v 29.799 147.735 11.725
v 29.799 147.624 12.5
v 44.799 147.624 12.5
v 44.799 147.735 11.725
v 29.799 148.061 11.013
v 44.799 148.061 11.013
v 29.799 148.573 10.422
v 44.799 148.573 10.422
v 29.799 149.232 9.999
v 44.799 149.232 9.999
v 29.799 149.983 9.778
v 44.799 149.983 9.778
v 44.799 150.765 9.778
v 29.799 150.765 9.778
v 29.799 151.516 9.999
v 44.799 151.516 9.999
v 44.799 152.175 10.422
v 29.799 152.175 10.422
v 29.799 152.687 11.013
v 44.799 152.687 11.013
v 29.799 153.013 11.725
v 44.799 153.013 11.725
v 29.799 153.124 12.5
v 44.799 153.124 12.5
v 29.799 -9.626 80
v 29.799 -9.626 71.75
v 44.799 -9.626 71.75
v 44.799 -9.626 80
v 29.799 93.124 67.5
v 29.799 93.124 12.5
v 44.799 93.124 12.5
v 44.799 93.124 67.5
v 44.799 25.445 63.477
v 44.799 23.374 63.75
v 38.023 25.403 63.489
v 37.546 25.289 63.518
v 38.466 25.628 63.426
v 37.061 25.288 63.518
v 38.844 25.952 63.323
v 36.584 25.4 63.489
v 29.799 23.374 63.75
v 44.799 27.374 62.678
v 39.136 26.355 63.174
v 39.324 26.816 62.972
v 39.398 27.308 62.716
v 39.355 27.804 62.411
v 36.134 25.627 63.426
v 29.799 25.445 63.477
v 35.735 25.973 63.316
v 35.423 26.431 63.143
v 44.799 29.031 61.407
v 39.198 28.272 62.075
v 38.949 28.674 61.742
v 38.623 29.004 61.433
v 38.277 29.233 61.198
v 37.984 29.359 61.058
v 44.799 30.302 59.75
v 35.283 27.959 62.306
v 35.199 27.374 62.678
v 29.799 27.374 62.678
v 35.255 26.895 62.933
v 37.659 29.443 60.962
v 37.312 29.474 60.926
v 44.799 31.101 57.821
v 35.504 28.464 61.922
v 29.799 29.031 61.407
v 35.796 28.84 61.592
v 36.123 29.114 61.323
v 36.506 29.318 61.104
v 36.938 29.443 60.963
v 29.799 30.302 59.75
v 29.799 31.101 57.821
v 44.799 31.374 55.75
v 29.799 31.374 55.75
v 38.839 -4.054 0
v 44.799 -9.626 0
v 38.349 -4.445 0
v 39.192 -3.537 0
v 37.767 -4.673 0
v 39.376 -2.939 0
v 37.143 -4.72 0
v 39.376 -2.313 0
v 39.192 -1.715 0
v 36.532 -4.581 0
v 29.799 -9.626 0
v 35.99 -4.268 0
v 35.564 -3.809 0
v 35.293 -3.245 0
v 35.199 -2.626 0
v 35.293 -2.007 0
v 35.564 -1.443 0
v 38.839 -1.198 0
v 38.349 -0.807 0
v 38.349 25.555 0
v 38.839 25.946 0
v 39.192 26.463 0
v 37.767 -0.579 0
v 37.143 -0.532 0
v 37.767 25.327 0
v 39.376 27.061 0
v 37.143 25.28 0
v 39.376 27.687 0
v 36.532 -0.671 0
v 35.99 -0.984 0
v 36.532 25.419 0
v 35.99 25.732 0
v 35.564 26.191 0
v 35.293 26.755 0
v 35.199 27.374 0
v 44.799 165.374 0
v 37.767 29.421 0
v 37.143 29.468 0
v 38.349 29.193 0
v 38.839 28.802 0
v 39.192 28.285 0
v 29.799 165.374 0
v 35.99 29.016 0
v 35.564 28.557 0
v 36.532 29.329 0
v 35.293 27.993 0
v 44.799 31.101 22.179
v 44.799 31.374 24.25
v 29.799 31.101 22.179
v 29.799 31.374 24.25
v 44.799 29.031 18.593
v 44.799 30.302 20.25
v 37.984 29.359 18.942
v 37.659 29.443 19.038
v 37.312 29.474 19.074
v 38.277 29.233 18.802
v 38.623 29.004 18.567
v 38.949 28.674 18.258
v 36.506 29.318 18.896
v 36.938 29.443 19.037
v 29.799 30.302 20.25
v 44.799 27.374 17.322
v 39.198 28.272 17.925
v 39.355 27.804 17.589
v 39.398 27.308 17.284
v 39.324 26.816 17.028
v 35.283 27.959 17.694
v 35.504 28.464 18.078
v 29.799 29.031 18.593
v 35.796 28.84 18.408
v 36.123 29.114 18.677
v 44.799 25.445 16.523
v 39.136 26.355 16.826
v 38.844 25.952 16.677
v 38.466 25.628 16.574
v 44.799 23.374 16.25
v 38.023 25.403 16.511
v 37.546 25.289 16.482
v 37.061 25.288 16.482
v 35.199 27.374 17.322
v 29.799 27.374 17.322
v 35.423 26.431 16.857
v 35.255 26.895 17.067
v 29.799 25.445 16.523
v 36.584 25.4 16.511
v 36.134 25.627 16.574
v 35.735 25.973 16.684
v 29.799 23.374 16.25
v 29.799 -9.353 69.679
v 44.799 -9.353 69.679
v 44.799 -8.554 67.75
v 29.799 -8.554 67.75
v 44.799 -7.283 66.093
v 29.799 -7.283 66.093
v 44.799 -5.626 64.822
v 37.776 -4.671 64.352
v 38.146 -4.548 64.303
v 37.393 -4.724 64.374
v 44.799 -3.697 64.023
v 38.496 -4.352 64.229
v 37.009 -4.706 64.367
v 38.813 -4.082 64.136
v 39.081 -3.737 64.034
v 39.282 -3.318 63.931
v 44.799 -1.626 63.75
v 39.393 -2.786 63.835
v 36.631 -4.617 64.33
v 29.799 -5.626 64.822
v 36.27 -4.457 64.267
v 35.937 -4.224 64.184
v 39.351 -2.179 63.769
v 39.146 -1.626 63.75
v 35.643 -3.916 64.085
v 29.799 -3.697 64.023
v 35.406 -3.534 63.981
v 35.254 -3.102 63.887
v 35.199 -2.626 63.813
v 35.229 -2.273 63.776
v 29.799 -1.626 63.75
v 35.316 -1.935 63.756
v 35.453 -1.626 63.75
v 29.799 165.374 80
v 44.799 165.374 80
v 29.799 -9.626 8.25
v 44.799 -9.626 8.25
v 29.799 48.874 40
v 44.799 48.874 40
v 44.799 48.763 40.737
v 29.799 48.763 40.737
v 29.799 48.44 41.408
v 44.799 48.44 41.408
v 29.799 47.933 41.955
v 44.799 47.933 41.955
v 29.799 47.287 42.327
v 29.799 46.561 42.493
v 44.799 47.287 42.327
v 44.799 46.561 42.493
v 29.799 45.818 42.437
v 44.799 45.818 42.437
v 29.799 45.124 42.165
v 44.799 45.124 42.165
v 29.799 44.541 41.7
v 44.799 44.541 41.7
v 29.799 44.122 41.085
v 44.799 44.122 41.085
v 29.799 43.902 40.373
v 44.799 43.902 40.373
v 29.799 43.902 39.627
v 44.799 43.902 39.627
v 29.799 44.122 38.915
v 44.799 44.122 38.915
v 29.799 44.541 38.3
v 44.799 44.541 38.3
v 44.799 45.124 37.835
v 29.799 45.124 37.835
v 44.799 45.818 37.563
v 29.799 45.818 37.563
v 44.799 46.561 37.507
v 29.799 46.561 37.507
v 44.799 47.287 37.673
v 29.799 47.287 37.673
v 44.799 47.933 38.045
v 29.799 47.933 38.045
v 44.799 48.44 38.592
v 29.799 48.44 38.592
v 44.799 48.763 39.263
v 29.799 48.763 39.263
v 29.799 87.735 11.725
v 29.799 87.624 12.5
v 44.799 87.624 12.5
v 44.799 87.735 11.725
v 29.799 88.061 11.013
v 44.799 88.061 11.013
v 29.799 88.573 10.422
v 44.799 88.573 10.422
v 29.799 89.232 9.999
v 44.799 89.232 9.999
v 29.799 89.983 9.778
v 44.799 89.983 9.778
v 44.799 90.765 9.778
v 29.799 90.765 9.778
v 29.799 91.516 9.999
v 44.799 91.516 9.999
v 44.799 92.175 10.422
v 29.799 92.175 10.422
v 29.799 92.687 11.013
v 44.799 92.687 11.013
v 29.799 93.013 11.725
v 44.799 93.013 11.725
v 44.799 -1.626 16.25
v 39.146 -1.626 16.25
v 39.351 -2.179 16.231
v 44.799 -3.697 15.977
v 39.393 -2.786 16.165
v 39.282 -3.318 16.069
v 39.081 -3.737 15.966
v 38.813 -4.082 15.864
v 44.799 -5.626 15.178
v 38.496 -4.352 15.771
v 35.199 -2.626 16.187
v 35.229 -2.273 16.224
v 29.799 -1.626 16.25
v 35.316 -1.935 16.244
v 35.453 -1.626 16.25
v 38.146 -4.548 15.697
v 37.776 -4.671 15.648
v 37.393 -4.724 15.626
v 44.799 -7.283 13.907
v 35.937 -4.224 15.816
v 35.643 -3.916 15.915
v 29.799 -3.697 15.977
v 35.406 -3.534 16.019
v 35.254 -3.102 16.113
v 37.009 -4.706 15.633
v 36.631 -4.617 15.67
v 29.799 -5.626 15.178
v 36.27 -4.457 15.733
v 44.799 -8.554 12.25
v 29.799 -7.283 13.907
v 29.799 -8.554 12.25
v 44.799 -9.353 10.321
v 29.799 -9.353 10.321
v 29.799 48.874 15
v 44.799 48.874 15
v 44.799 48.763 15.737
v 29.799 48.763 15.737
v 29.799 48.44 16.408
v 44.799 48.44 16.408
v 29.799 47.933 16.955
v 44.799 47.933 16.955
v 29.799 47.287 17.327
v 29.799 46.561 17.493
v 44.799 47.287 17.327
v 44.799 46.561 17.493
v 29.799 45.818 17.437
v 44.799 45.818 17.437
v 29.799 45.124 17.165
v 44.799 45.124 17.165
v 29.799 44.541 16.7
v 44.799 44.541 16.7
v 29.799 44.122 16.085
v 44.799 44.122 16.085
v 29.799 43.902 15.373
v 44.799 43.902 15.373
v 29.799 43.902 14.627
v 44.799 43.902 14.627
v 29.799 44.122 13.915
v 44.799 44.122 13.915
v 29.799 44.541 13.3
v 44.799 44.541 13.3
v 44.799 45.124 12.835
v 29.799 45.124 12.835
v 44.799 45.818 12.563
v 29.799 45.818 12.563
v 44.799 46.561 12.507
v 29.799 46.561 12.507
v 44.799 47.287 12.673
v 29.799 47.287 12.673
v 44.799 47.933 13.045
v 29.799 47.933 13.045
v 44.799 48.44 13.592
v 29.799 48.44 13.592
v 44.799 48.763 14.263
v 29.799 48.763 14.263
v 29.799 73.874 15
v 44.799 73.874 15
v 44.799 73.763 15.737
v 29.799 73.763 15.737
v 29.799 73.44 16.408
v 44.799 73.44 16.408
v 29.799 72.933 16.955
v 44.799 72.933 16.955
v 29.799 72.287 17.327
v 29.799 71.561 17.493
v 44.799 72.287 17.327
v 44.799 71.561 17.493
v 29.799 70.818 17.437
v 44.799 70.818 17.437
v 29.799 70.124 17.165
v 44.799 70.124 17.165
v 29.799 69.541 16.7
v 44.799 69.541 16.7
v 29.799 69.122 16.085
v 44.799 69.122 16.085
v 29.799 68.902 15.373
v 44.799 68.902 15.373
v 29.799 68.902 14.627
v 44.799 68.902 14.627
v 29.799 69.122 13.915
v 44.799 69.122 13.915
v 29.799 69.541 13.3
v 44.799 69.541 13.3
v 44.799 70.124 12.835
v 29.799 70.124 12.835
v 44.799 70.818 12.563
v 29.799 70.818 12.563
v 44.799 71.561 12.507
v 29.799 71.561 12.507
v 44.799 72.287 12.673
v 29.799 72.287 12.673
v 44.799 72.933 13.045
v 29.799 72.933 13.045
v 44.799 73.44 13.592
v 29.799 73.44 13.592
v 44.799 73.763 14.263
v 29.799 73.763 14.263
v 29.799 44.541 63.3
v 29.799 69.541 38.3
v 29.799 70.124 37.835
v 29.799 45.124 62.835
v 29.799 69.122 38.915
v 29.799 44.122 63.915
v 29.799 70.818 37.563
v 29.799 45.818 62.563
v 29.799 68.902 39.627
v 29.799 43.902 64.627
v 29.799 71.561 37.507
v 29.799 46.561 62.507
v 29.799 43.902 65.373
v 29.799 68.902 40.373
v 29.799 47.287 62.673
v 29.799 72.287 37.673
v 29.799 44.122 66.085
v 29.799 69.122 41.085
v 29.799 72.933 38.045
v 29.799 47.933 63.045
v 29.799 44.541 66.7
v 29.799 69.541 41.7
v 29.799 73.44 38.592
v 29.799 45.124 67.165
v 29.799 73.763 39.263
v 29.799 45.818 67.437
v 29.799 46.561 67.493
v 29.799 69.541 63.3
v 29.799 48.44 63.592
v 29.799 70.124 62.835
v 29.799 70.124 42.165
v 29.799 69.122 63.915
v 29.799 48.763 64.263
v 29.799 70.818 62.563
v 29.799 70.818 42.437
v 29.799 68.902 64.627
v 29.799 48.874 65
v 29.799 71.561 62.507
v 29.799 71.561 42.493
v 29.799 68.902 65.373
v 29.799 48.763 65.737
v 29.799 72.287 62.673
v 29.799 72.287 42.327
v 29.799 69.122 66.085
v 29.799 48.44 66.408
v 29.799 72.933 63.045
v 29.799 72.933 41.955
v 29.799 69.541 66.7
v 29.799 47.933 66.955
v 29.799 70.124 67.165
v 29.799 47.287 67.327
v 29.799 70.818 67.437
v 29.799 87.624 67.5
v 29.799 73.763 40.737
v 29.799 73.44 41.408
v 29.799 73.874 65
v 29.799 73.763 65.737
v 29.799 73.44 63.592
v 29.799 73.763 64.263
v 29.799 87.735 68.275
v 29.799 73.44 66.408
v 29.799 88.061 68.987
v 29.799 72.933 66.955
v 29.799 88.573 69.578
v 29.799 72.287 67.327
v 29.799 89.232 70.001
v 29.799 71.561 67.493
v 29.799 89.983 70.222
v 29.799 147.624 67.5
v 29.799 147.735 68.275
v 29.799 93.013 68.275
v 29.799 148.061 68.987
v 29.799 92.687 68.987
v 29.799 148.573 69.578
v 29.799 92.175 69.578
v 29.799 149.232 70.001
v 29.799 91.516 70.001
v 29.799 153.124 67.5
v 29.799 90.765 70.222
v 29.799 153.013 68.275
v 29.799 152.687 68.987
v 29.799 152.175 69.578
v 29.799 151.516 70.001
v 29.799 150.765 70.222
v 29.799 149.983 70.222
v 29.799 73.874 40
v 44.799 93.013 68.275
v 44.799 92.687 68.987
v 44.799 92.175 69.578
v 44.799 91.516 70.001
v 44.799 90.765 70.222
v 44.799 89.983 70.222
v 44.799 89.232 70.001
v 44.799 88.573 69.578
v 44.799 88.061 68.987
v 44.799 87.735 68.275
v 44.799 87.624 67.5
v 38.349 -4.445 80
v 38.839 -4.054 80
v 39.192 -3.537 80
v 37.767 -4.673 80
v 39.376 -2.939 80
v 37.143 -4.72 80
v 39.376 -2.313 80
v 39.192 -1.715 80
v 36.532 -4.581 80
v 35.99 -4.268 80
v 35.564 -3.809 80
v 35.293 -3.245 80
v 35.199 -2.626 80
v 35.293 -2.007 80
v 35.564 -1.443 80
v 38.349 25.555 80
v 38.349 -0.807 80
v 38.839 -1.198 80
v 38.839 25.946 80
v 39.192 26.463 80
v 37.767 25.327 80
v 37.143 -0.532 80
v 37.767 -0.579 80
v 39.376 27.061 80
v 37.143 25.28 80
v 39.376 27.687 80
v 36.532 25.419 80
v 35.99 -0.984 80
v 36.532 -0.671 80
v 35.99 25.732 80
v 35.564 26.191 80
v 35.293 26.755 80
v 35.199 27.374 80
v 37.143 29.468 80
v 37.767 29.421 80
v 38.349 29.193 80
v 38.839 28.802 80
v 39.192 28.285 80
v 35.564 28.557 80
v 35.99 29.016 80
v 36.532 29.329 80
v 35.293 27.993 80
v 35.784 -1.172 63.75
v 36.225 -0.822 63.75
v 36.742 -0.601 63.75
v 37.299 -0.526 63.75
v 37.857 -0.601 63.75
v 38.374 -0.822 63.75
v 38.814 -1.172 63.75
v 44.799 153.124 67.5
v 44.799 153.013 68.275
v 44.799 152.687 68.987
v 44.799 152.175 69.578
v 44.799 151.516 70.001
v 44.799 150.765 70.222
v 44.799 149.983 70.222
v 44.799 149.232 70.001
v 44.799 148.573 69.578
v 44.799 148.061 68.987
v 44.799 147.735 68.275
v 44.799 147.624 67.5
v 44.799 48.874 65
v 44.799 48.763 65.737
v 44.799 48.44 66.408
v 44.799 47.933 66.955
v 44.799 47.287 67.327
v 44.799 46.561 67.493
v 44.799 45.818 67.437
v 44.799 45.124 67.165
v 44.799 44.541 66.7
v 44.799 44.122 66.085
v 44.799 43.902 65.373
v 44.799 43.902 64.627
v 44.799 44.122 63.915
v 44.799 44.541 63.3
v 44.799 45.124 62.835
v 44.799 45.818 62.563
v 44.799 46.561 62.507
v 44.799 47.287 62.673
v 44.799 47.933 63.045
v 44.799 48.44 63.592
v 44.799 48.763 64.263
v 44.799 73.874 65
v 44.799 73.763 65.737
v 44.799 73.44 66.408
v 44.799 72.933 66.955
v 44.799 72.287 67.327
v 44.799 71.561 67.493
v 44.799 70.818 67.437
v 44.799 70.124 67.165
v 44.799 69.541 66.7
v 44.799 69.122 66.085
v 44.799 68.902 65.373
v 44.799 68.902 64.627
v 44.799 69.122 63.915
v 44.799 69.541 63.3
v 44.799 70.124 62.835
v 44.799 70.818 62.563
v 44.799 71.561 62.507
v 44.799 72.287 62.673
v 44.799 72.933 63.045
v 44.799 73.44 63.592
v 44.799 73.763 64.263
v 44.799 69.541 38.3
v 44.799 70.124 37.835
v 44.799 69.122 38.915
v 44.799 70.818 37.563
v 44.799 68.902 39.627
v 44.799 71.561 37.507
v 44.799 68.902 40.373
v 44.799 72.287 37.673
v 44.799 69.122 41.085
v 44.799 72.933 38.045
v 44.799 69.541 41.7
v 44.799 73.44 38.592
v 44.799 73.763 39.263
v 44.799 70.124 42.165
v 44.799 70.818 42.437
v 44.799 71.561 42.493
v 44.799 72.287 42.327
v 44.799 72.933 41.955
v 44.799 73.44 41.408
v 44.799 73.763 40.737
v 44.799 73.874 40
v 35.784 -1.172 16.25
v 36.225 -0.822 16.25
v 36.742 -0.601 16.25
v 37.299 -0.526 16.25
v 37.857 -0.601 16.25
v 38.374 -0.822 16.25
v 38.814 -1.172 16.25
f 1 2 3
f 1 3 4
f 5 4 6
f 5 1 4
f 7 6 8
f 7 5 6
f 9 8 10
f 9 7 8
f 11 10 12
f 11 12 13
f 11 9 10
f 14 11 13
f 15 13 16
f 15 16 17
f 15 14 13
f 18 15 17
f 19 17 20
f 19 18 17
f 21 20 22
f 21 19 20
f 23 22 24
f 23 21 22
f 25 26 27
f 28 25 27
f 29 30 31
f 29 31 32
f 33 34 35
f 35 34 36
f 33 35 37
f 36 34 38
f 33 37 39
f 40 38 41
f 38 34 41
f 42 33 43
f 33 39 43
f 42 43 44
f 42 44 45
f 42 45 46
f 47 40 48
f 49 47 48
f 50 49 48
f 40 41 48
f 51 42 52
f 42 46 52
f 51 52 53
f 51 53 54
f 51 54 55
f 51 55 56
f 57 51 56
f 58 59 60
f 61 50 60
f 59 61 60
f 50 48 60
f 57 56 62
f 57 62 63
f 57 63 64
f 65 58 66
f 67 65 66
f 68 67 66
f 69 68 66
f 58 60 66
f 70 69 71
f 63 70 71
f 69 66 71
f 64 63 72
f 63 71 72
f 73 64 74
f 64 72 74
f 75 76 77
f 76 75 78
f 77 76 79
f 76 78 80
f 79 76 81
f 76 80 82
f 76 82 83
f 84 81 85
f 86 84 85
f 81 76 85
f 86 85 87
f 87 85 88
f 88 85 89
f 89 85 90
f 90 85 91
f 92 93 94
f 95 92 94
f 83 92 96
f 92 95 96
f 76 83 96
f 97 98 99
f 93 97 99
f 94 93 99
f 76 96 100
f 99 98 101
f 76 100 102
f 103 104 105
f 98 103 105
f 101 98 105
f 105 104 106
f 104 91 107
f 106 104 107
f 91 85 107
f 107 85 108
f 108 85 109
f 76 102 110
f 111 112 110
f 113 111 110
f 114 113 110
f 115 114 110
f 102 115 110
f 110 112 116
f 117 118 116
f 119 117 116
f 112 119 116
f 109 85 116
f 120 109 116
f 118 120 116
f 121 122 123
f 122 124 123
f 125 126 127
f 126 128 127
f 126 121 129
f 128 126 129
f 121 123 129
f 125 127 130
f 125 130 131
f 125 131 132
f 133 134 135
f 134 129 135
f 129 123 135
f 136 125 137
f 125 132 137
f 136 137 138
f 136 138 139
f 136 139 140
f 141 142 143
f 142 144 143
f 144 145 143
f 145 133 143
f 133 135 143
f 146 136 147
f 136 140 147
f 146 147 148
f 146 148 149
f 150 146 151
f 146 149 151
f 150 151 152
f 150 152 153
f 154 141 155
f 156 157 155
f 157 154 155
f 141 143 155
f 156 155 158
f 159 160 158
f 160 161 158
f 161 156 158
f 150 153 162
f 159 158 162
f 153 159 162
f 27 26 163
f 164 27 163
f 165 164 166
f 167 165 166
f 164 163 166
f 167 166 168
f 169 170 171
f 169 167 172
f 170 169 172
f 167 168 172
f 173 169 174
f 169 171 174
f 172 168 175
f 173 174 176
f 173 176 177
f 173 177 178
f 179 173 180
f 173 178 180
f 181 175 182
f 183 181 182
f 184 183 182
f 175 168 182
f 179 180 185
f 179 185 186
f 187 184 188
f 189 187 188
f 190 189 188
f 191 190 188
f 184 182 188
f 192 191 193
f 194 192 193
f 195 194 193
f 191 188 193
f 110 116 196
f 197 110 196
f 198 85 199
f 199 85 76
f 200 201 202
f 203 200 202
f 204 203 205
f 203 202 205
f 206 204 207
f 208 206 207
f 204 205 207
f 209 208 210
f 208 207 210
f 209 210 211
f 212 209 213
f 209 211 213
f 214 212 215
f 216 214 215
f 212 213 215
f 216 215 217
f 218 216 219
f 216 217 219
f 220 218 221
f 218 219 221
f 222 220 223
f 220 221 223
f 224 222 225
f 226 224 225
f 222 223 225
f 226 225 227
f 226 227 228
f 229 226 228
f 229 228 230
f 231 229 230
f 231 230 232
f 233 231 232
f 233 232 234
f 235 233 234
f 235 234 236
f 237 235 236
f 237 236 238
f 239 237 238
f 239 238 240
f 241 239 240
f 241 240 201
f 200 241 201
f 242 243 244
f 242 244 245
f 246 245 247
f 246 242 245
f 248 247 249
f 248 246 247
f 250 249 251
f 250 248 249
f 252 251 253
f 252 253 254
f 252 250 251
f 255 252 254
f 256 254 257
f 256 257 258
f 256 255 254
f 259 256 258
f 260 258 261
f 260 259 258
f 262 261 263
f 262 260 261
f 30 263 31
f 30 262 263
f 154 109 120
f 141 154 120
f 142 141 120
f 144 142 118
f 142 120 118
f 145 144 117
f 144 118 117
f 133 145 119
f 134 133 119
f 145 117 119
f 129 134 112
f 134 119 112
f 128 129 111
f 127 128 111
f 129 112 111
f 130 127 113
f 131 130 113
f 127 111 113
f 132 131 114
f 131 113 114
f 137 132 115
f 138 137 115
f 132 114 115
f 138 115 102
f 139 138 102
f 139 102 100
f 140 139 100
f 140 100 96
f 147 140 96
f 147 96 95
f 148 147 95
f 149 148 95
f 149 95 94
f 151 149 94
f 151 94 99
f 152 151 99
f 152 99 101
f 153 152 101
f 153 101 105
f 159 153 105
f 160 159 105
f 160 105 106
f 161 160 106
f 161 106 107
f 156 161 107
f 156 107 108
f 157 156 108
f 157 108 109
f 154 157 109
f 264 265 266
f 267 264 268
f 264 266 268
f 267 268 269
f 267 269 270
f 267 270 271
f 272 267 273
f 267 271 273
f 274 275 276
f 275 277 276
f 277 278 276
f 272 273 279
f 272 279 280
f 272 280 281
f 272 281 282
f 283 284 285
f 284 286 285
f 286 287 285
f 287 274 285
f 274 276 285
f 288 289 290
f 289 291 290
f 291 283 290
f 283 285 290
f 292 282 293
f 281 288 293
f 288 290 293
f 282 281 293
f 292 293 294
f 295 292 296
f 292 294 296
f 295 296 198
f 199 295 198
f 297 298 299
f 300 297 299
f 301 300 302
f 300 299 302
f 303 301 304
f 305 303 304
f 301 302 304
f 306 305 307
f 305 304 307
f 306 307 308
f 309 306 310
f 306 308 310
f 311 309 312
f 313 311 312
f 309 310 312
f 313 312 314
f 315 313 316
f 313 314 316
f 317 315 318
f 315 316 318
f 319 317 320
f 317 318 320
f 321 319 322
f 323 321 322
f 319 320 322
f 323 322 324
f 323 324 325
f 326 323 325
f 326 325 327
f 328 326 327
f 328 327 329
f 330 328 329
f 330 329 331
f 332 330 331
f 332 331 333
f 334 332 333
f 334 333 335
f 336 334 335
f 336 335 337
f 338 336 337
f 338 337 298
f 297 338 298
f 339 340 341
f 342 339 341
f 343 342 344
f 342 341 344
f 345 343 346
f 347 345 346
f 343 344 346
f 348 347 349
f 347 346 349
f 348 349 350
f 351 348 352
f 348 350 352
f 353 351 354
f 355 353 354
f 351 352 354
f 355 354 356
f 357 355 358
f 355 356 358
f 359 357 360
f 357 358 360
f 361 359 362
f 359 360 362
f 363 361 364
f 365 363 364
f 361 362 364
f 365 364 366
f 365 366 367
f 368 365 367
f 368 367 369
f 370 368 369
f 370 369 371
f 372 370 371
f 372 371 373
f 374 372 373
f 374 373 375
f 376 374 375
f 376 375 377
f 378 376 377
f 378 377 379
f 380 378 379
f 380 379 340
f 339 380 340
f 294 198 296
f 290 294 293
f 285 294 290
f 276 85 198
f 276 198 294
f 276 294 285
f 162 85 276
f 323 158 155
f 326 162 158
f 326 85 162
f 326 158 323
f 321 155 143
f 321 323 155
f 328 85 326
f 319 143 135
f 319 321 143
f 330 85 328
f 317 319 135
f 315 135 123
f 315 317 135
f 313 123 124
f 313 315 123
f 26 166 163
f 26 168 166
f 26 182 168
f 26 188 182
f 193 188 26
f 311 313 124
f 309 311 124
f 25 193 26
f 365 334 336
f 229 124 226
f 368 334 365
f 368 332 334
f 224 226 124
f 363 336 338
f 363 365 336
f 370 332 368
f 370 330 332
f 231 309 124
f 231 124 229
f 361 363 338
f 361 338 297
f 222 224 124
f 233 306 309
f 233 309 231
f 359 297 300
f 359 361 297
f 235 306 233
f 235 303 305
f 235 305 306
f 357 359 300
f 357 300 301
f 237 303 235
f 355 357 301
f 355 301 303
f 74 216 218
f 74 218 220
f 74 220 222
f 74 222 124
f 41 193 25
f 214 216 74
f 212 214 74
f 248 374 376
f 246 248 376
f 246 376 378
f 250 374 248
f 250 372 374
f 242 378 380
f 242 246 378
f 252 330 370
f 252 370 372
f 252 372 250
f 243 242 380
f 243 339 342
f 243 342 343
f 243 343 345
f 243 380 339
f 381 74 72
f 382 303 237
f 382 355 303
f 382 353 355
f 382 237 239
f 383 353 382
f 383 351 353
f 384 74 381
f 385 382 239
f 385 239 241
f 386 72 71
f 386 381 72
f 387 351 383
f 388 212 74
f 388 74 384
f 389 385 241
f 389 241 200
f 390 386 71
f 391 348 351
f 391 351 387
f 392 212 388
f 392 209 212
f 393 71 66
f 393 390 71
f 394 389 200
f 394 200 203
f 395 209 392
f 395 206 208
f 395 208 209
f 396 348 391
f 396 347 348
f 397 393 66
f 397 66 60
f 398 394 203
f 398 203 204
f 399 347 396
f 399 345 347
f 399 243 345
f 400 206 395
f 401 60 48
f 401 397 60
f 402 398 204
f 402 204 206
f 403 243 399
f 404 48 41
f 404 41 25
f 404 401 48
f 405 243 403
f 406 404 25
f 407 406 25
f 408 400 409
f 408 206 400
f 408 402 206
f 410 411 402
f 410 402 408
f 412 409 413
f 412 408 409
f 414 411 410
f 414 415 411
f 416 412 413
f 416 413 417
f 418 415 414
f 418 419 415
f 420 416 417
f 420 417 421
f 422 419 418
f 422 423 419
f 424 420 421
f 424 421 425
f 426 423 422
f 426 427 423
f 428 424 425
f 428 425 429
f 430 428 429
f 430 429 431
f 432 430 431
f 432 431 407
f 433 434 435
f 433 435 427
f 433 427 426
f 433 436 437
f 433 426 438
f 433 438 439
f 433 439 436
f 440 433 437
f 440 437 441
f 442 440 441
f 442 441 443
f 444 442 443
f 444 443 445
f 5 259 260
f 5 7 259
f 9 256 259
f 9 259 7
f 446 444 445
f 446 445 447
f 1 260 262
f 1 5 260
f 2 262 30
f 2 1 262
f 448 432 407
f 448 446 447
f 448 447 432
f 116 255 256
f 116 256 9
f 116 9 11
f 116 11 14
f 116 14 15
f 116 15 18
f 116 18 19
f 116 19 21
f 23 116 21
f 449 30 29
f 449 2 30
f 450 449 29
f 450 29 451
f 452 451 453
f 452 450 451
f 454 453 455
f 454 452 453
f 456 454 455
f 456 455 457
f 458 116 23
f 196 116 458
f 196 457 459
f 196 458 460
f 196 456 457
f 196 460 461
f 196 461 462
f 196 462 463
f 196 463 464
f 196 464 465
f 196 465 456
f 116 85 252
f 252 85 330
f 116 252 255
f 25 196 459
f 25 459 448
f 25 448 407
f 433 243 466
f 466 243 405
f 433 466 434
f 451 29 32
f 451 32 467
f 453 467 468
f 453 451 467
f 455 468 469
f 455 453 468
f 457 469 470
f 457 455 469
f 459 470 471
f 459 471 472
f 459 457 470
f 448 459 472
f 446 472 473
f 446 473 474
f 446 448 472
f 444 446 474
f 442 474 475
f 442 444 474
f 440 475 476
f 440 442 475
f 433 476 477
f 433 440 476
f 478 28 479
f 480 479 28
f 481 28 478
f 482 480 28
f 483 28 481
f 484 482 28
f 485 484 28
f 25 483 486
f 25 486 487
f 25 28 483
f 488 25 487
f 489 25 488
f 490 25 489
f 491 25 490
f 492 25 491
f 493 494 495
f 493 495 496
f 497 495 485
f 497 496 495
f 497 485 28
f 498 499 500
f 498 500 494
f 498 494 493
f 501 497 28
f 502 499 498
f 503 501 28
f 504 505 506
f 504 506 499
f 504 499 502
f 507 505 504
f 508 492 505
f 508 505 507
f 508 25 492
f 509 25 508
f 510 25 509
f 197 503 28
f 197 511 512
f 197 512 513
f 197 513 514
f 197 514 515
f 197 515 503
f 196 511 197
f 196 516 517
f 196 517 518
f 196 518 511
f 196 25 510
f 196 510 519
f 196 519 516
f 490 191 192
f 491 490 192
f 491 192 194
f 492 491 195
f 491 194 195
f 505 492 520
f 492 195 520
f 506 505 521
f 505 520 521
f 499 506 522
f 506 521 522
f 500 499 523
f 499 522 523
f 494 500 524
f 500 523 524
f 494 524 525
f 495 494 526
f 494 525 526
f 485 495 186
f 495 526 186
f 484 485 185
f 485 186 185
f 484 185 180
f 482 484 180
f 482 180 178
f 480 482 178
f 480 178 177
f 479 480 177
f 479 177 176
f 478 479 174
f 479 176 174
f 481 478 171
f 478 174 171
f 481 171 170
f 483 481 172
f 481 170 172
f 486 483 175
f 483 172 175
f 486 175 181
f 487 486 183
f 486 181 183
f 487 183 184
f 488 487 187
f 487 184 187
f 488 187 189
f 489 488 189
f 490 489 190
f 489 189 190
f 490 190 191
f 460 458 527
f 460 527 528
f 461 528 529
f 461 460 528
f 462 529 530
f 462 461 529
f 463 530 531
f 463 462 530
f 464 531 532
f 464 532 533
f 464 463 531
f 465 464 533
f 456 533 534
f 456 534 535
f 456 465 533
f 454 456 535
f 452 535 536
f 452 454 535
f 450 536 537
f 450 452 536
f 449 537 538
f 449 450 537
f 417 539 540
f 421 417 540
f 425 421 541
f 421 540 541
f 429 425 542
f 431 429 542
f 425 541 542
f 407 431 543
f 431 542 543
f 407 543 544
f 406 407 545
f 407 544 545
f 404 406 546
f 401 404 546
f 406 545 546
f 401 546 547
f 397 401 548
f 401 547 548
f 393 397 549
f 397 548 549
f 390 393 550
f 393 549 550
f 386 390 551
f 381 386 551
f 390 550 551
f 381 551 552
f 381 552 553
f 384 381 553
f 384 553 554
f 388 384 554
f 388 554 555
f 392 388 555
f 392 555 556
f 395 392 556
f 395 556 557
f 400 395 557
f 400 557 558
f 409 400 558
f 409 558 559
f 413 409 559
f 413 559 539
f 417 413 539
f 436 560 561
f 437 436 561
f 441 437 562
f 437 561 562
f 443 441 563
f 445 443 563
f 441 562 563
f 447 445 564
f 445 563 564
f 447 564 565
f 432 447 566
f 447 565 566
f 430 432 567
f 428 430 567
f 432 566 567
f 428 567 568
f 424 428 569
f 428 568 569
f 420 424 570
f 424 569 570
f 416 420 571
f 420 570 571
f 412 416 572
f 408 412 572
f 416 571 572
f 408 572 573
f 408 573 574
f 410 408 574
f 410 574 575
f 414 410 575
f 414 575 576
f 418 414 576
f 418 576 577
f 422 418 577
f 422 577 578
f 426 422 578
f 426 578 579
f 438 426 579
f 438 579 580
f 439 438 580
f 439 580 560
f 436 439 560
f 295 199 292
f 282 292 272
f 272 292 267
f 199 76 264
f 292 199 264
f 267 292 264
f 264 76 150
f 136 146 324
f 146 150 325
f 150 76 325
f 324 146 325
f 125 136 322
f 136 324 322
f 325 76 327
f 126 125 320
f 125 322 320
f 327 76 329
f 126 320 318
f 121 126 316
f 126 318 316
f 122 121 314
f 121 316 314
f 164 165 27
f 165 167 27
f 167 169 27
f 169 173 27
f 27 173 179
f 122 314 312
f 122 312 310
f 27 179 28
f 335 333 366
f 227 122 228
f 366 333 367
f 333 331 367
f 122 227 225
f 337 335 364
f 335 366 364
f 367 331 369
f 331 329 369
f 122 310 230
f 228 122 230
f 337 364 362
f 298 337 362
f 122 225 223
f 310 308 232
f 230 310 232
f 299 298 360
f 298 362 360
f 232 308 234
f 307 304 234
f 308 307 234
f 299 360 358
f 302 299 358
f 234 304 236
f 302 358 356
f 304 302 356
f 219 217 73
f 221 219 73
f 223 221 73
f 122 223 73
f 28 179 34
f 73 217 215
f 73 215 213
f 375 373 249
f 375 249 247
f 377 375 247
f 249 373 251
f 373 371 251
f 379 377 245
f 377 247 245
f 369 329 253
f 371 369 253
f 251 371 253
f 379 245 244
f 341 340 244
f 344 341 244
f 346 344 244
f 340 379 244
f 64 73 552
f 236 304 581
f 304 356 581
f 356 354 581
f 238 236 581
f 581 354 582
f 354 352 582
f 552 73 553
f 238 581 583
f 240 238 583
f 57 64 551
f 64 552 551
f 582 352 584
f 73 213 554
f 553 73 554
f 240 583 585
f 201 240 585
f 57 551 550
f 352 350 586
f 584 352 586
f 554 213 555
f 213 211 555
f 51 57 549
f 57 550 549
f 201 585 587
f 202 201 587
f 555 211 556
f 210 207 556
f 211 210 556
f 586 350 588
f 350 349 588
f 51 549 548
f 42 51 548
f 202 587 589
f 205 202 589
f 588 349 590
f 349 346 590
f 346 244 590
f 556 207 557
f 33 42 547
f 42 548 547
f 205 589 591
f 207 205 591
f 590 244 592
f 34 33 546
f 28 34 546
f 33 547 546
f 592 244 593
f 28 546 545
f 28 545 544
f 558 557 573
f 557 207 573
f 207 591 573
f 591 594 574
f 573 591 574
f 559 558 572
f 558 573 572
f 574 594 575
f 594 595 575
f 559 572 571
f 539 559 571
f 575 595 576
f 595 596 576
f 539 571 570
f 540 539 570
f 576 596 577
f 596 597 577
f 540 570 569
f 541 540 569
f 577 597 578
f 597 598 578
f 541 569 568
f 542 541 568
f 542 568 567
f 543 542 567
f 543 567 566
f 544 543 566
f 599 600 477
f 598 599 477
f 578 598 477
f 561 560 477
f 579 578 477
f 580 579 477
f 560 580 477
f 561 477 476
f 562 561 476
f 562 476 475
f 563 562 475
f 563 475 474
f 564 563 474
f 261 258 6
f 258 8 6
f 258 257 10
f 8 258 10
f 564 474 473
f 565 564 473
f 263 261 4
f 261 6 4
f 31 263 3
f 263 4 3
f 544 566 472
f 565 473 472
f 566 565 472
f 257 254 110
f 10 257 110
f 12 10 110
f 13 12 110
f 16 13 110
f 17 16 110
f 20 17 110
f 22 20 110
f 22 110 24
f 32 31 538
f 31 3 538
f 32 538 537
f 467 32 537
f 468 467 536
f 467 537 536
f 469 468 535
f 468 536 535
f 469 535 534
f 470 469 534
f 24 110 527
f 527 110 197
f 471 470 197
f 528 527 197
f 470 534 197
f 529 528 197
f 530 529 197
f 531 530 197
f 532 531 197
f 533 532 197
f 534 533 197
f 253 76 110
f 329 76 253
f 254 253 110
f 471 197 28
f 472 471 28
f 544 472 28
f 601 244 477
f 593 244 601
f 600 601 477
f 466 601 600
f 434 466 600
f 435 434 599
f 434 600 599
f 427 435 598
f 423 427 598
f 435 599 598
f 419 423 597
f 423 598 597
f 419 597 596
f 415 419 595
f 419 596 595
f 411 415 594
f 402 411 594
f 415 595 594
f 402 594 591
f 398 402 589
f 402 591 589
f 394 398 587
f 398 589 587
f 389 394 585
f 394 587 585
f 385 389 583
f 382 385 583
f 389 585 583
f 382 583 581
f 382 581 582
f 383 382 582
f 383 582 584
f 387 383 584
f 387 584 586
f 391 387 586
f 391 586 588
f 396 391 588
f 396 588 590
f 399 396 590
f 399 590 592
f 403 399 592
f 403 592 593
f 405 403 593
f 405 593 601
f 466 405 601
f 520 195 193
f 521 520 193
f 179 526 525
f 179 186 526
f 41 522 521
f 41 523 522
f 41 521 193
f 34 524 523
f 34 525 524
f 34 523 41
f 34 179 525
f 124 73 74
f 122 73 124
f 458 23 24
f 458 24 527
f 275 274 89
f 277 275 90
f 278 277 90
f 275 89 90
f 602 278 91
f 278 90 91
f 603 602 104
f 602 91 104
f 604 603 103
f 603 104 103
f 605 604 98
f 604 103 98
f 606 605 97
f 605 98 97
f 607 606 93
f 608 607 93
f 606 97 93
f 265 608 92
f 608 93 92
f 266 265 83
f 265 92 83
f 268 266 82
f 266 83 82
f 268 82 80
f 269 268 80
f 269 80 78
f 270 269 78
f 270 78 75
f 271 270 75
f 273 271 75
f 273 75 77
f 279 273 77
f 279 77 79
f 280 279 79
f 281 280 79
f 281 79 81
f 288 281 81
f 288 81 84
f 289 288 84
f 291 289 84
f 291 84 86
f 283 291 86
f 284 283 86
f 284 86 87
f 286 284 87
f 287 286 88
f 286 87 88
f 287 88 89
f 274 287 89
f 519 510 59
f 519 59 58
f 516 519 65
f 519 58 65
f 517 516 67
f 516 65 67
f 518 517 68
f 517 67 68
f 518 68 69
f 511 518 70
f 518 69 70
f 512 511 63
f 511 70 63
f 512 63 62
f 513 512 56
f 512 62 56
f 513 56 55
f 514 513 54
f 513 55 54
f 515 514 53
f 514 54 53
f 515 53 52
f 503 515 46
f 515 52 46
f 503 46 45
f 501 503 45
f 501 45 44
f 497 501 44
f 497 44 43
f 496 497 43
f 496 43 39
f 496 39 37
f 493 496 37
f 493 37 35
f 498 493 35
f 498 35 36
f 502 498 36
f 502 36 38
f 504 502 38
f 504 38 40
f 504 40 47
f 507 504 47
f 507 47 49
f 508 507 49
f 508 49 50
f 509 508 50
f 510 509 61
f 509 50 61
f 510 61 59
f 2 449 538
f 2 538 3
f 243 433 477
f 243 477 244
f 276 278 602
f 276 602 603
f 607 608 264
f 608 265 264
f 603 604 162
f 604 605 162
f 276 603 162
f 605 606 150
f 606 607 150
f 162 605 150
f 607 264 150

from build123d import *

# Parameters (mm, degrees)
ESQUISSE1_W                   = 15
ESQUISSE1_H                   = 90
BOSS_EXTRU_1_DEPTH            = 80
ESQUISSE2_W                   = 47.5
ESQUISSE2_H                   = 41
ENL_V_MAT_EXTRU_1_DEPTH       = 115.38963181
CONG_1_R                      = 8
ESQUISSE3_W                   = 80
ESQUISSE3_H                   = 85
BOSS_EXTRU_2_DEPTH            = 15
TROU_TARAUD_M5X0_81_D         = 4.2
TROU_TARAUD_PROFOND_M6X1_01_D = 5
R_P_TITION_LIN_AIRE1_COUNT    = 2
R_P_TITION_LIN_AIRE1_PITCH    = 25


with BuildPart() as part:
    # Esquisse1 → Boss.-Extru.1 (new body)
    with BuildSketch(Plane.XY):
        with Locations((37.299465669, 35.374049703)):
            Rectangle(ESQUISSE1_W, ESQUISSE1_H)
    extrude(amount=BOSS_EXTRU_1_DEPTH)

    # Esquisse2 → Enlèv. mat.-Extru.1 (cut, through all)
    with BuildSketch(Plane(origin=(44.799465669, 0, 0), x_dir=(0, 0, -1), z_dir=(1, 0, 0))):
        with Locations((-40, 10.874049703)):
            Rectangle(ESQUISSE2_W, ESQUISSE2_H)
    extrude(amount=-ENL_V_MAT_EXTRU_1_DEPTH, mode=Mode.SUBTRACT)

    # Congé1
    cong_1_edges = [part.edges().sort_by_distance(p)[0] for p in [
        (37.299465669, -9.625950297, 63.75),
        (37.299465669, 31.374049703, 63.75),
        (37.299465669, 31.374049703, 16.25),
        (37.299465669, -9.625950297, 16.25),
    ]]
    fillet(cong_1_edges, radius=CONG_1_R)

    # Esquisse3 → Boss.-Extru.2 (add)
    with BuildSketch(Plane.ZY.offset(-29.799465669)):
        with Locations((40, 122.874049703)):
            Rectangle(ESQUISSE3_W, ESQUISSE3_H)
        with BuildLine():
            Line((12.5, 93.124049703), (67.5, 93.124049703))
            ThreePointArc((67.5, 93.124049703), (70.25, 90.374049703), (67.5, 87.624049703))
            Line((67.5, 87.624049703), (12.5, 87.624049703))
            ThreePointArc((12.5, 87.624049703), (9.75, 90.374049703), (12.5, 93.124049703))
        make_face(mode=Mode.SUBTRACT)
        with BuildLine():
            Line((12.5, 153.124049703), (67.5, 153.124049703))
            ThreePointArc((67.5, 153.124049703), (70.25, 150.374049703), (67.5, 147.624049703))
            Line((67.5, 147.624049703), (12.5, 147.624049703))
            ThreePointArc((12.5, 147.624049703), (9.75, 150.374049703), (12.5, 153.124049703))
        make_face(mode=Mode.SUBTRACT)
    extrude(amount=-BOSS_EXTRU_2_DEPTH)

    # Trou taraudé M5x0.81 (through all)
    with Locations(Plane(origin=(37.299465669, -2.625950297, 80), x_dir=(1, 0, 0), z_dir=(0, 0, 1))):
        with Locations((0, 0), (0, 30)):
            trou_taraud_m5x0_81 = Hole(TROU_TARAUD_M5X0_81_D / 2)

    # Symétrie1: Trou taraudé M5x0.81 across plane
    add(trou_taraud_m5x0_81.mirror(Plane.XY.offset(40)), mode=Mode.SUBTRACT)

    # Trou taraudé profond M6x1.01 (through all)
    with Locations(Plane(origin=(29.799465669, 46.374049703, 15), x_dir=(0, -1, 0), z_dir=(-1, 0, 0))):
        with Locations((0, 0), (0, 25), (0, 50)):
            trou_taraud_profond_m6x1_01 = Hole(TROU_TARAUD_PROFOND_M6X1_01_D / 2)

    # Répétition linéaire1: Trou taraudé profond M6x1.01 ×2
    with Locations(*[(0, i * R_P_TITION_LIN_AIRE1_PITCH, 0) for i in range(1, R_P_TITION_LIN_AIRE1_COUNT)]):
        add(trou_taraud_profond_m6x1_01, mode=Mode.SUBTRACT)


solid = part.part
